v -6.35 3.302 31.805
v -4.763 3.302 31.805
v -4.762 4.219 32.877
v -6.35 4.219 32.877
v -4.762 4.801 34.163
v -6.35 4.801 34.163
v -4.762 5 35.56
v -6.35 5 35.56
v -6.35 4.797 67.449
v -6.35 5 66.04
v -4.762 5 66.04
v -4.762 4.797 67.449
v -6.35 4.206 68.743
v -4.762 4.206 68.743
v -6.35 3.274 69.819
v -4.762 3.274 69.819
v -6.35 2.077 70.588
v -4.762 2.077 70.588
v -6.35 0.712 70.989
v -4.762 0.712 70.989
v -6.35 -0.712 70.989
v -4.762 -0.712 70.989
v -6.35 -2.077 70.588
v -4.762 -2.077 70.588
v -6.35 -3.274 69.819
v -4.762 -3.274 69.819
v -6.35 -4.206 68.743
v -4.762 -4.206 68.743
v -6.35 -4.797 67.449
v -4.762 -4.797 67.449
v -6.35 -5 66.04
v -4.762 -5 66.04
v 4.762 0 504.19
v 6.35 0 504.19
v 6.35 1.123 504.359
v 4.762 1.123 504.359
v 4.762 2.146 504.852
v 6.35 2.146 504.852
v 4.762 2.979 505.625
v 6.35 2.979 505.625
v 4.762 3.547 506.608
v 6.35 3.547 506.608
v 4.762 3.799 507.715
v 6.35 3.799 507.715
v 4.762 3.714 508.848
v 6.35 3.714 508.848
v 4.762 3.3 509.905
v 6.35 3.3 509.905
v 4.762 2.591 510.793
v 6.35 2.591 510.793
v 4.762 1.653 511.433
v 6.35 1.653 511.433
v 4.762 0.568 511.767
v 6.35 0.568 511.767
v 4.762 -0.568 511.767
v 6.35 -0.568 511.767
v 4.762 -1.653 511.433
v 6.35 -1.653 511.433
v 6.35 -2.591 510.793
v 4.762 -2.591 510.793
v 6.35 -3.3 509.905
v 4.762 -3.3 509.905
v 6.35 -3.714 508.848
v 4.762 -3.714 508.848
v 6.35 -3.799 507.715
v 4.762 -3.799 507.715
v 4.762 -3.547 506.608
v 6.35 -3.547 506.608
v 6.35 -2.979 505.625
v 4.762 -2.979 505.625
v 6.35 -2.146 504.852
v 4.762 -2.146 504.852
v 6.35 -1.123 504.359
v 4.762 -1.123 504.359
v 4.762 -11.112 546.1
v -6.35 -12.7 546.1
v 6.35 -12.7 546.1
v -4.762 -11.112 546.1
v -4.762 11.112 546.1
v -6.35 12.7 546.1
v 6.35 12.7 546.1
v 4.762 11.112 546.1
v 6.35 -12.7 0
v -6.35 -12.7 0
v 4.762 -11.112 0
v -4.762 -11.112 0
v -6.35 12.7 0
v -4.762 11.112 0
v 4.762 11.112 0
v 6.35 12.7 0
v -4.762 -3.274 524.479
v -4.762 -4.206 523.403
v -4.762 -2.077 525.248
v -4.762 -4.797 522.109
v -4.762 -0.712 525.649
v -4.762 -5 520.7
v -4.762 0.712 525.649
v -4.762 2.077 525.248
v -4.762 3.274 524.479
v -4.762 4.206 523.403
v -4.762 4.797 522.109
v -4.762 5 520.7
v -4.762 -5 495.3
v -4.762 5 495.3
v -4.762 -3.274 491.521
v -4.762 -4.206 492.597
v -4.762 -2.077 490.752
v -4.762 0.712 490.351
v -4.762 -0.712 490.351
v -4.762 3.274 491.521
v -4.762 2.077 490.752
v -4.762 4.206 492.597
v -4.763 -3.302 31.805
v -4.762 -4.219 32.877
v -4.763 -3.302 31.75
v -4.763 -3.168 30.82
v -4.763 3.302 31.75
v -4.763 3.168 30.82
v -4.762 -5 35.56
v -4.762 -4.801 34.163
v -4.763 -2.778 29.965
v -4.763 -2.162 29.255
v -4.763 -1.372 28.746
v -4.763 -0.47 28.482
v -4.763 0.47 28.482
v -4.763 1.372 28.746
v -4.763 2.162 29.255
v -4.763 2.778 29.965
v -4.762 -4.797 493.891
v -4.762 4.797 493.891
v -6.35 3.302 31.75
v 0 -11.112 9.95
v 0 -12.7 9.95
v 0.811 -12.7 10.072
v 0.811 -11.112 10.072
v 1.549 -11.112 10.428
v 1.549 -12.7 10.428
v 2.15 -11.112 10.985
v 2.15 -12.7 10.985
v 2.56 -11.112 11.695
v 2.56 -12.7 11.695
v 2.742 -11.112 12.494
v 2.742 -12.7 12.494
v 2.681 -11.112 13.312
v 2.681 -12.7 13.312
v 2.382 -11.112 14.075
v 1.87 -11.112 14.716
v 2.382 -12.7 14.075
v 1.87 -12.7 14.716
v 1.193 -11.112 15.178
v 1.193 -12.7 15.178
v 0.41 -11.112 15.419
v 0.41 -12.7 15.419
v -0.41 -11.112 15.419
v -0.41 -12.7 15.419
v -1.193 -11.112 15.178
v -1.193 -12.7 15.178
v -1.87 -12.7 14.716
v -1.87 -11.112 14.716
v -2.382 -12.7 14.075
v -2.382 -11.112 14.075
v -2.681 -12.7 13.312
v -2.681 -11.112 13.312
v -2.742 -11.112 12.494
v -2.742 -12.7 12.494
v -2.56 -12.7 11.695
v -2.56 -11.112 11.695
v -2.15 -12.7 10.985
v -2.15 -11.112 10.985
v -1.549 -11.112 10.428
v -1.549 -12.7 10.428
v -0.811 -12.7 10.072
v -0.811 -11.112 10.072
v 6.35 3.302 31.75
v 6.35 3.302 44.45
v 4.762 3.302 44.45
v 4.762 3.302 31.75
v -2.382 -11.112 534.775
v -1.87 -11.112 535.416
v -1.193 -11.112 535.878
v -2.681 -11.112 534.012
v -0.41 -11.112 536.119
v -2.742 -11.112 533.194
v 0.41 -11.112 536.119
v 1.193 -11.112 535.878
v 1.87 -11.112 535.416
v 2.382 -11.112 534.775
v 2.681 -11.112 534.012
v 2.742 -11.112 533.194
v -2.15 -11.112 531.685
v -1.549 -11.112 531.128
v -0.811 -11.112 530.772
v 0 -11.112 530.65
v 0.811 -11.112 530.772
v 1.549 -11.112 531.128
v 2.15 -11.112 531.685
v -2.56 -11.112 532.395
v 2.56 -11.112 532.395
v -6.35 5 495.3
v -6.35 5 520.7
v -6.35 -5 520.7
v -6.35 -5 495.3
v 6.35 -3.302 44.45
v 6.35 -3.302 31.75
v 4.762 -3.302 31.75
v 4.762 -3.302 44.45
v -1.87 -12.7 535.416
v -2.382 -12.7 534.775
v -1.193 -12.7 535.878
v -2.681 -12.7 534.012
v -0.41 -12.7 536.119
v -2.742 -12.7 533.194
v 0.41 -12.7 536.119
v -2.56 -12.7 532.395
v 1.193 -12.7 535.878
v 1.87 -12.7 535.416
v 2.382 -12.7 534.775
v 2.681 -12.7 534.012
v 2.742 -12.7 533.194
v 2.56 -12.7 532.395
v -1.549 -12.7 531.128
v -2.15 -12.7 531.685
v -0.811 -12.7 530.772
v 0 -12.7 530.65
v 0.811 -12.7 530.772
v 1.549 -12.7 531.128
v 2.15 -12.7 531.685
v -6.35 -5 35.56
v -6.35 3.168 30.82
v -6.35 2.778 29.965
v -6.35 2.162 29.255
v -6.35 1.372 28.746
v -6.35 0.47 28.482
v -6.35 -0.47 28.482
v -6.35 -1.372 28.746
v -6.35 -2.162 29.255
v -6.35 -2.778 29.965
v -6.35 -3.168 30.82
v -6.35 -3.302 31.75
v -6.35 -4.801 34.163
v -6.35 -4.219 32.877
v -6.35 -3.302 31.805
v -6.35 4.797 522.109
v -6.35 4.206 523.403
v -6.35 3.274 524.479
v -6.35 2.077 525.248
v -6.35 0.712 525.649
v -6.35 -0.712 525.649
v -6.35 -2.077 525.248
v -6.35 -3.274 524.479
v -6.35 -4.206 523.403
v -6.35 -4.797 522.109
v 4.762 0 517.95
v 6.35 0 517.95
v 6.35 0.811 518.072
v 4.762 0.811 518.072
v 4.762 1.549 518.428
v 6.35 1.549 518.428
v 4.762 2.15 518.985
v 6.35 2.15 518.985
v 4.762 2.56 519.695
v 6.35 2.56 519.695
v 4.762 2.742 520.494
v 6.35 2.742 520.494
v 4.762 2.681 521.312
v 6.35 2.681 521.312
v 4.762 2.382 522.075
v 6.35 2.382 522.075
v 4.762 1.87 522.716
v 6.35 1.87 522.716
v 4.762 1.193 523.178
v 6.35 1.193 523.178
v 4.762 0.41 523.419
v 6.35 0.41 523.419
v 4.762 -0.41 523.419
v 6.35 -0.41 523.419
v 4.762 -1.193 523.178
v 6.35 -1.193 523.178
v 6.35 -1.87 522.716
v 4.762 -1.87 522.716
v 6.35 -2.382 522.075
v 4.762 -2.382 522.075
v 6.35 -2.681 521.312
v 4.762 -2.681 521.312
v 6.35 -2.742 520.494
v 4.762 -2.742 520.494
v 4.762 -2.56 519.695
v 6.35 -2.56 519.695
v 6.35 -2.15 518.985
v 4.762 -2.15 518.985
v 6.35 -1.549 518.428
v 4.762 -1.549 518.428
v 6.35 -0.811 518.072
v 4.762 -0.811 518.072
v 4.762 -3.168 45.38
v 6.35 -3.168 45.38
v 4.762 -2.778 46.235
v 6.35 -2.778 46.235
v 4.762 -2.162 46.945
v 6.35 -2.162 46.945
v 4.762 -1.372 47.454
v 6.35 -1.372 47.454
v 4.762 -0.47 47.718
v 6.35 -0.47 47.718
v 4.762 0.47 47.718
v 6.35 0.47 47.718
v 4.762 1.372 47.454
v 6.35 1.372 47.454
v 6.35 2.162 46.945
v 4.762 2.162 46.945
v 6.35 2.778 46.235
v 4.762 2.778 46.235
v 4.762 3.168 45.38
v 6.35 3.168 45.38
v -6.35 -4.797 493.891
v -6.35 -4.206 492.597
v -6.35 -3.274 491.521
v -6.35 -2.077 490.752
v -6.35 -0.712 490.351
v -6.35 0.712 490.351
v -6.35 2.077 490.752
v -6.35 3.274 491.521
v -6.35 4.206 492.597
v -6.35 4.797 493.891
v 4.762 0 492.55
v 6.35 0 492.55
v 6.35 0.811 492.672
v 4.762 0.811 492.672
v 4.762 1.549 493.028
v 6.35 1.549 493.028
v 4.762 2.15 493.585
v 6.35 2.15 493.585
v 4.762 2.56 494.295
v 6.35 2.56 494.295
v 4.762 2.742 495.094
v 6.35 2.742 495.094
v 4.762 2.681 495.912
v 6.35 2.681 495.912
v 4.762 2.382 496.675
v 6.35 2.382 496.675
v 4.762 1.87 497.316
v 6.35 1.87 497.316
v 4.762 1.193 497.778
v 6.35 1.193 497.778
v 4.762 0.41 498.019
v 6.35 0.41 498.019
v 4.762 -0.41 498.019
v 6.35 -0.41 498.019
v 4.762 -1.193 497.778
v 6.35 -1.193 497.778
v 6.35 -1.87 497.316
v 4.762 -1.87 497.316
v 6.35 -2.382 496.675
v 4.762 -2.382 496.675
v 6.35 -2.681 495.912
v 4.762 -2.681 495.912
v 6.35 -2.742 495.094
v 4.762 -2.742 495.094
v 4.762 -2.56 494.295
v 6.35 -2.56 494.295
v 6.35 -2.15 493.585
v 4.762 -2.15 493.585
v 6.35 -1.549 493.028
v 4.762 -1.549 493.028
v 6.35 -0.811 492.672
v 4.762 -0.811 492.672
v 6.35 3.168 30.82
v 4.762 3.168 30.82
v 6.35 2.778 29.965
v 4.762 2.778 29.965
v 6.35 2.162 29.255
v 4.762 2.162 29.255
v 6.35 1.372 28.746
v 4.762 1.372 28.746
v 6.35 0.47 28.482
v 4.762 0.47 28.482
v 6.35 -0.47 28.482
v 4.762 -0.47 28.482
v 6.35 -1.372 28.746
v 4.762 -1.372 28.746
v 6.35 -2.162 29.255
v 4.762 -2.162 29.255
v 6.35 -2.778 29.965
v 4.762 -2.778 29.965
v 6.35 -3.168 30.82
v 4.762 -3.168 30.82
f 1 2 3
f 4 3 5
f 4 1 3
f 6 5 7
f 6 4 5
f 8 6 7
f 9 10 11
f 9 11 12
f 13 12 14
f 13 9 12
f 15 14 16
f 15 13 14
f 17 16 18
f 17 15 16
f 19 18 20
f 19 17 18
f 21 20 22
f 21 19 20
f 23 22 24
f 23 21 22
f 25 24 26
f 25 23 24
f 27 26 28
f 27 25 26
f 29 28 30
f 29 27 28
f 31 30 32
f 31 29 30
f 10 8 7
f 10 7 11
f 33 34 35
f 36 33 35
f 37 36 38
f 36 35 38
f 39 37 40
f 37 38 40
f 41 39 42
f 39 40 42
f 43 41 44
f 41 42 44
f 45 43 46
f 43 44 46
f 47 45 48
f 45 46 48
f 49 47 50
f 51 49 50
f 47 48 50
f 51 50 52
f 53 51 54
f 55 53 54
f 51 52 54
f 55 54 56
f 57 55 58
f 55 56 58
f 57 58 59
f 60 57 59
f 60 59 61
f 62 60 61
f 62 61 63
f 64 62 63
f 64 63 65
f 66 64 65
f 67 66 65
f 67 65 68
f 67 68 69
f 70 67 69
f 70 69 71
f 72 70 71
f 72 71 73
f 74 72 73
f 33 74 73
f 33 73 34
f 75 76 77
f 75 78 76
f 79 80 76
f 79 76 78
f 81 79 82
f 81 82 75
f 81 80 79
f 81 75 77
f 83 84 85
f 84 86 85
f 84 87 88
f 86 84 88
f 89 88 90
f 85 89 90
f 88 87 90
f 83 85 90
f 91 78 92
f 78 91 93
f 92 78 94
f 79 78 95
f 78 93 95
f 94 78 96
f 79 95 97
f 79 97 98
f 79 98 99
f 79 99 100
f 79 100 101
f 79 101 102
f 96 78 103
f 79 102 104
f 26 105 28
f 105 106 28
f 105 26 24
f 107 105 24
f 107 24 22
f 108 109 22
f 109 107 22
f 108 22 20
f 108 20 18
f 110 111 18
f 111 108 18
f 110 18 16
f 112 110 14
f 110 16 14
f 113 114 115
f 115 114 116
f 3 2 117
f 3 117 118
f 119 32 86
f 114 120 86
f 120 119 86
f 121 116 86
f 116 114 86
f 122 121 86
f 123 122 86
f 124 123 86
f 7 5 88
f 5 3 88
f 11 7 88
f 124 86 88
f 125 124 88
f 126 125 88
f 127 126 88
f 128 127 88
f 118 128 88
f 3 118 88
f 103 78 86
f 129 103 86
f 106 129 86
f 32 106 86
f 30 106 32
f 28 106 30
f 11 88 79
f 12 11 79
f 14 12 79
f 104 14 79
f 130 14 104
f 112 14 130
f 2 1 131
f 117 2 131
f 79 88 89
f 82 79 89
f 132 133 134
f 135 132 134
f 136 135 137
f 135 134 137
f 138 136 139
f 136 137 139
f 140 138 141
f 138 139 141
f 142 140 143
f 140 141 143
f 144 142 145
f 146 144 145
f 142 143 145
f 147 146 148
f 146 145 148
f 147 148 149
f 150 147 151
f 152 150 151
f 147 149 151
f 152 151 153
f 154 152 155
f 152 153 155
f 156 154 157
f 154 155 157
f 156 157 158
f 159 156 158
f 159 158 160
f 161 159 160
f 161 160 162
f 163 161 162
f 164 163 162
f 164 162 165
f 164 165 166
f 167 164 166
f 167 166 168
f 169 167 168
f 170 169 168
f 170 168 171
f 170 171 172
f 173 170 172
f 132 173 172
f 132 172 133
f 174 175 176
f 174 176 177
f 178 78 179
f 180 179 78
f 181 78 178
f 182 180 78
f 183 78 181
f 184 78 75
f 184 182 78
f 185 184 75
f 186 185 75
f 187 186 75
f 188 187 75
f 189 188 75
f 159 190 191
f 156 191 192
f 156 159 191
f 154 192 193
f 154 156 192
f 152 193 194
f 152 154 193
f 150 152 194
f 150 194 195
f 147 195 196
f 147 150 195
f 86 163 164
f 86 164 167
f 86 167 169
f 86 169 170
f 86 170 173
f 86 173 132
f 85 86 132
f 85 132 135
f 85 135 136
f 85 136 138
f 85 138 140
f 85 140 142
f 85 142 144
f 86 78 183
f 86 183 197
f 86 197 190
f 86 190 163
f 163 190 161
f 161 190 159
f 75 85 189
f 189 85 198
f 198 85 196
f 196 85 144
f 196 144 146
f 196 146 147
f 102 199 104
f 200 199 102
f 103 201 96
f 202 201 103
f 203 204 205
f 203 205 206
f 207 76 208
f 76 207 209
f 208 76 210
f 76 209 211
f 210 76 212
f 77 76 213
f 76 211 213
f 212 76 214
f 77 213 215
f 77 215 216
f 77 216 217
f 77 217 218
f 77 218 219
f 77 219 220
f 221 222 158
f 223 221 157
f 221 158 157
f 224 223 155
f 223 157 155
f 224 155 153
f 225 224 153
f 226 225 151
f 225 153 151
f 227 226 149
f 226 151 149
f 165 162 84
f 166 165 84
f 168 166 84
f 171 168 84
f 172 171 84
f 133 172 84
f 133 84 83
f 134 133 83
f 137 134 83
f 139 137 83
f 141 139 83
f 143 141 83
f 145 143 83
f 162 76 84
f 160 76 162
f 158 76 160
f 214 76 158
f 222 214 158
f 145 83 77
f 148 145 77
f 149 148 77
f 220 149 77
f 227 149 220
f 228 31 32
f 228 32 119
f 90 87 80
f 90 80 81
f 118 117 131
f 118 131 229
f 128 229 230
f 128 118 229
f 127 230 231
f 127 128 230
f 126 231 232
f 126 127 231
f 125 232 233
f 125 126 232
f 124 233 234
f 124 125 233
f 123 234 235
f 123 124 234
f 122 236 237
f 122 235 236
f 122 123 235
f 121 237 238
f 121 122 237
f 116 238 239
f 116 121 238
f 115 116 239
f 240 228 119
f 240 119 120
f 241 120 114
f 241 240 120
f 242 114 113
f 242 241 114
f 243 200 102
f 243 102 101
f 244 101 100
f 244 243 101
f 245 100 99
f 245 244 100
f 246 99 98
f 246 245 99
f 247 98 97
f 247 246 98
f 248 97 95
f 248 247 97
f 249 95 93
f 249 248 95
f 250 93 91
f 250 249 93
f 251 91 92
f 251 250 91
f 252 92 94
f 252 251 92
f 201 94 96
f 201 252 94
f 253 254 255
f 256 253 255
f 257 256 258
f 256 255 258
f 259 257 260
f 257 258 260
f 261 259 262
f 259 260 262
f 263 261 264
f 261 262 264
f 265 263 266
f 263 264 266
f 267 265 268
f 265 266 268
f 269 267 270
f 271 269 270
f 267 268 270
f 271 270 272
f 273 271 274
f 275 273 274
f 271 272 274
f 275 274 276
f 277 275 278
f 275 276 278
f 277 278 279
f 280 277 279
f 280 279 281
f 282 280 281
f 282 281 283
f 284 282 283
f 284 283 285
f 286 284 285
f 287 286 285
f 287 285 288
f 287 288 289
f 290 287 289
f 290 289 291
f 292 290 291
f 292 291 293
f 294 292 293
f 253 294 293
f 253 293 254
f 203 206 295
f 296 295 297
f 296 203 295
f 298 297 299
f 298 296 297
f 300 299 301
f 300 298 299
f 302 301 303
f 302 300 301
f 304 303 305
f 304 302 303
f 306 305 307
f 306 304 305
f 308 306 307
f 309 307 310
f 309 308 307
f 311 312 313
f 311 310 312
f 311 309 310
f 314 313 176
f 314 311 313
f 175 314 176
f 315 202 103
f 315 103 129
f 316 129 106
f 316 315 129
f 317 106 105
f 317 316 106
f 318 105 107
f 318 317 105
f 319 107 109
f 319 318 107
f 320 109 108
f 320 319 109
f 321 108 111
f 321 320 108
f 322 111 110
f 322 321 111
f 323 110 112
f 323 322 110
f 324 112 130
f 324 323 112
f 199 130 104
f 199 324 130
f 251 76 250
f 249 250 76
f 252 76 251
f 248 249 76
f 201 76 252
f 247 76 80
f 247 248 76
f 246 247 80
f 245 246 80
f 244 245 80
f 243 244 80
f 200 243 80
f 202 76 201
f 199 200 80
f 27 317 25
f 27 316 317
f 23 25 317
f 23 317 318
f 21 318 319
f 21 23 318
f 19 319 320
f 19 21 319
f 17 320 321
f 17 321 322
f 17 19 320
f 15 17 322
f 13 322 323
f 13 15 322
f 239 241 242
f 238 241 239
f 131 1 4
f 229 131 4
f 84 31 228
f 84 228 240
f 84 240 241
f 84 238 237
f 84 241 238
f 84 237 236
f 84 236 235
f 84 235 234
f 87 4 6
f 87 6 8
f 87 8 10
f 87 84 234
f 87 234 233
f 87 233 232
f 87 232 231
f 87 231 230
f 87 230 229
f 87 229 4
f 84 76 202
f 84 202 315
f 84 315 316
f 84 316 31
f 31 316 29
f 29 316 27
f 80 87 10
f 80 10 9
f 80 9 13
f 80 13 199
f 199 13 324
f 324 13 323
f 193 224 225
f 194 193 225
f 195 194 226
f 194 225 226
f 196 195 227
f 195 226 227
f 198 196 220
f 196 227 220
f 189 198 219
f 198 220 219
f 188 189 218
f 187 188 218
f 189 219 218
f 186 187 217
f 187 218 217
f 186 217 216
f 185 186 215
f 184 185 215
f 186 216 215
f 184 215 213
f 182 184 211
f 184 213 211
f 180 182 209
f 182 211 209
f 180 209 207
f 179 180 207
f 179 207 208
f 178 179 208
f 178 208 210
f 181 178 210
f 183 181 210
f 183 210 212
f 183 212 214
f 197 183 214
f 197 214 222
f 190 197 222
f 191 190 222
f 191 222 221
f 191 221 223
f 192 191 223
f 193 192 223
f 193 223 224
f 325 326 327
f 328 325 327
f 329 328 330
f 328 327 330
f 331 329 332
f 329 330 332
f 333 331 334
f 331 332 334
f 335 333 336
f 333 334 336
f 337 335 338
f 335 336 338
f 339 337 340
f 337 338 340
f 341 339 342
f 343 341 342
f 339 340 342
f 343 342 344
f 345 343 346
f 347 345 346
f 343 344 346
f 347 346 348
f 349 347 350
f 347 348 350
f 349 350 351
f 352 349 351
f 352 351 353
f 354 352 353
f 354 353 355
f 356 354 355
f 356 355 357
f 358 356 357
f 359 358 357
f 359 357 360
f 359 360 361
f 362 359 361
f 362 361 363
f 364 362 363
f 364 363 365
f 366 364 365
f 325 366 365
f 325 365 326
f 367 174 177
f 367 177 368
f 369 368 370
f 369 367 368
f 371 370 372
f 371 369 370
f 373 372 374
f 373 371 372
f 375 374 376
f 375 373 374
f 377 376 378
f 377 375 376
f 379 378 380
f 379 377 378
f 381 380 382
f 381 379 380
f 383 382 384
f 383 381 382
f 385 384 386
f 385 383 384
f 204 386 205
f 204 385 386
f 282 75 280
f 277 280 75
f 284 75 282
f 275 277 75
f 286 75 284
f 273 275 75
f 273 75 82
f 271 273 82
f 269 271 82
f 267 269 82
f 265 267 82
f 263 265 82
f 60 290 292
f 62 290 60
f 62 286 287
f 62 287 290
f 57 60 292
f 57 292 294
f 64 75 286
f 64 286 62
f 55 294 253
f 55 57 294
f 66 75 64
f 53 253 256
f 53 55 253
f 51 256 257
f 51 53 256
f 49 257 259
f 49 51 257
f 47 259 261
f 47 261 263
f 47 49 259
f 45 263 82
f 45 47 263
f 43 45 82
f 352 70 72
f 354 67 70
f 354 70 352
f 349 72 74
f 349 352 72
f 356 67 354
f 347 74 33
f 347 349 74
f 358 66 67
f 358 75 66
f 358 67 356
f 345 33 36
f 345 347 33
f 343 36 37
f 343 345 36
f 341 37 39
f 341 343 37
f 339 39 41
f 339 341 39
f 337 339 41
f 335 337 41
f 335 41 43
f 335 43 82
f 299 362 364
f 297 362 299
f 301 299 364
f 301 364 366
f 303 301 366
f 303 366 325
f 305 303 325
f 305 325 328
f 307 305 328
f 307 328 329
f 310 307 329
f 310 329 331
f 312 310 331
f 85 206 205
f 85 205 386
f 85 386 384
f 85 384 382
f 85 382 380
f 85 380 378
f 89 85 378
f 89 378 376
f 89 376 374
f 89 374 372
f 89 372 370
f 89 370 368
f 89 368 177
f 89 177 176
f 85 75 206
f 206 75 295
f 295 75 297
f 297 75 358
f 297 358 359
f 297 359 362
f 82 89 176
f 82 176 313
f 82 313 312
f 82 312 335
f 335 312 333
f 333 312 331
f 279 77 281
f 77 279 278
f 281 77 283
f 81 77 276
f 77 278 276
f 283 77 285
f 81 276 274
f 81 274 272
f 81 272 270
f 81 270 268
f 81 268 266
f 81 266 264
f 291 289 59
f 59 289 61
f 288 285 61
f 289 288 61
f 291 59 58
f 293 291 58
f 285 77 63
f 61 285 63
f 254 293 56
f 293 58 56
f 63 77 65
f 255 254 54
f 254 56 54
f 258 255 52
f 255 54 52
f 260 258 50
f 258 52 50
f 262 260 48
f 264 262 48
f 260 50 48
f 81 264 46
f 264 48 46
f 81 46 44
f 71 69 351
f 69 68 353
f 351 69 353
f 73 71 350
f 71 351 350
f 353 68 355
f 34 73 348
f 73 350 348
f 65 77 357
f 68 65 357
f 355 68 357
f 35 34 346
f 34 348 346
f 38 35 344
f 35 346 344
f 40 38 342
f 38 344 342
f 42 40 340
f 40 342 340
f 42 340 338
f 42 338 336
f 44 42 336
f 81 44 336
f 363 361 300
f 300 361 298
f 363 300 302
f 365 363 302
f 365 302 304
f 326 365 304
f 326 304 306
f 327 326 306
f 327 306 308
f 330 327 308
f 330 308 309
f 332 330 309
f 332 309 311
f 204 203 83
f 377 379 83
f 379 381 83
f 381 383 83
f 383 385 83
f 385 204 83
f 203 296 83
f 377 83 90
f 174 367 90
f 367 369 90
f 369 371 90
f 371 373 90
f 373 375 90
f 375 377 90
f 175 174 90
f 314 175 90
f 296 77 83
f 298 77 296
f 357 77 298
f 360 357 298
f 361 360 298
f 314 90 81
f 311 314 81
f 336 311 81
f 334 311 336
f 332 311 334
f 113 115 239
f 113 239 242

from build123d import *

# Parameters (mm, degrees)
SKETCH1_W           = 12.7
SKETCH1_H           = 25.4
SKETCH1_W_2         = 9.525
SKETCH1_H_2         = 22.225
BOSS_EXTRUDE1_DEPTH = 546.1
SKETCH2_R           = 3.81
SKETCH2_R_2         = 2.75
CUT_EXTRUDE1_DEPTH  = 547.395269013
CUT_EXTRUDE3_REACH  = 548.395
CUT_EXTRUDE5_REACH  = 548.727
SKETCH5_R           = 2.75


with BuildPart() as part:
    # Sketch1 → Boss-Extrude1 (new body)
    with BuildSketch(Plane.XY):
        Rectangle(SKETCH1_W, SKETCH1_H)
        Rectangle(SKETCH1_W_2, SKETCH1_H_2, mode=Mode.SUBTRACT)
    extrude(amount=BOSS_EXTRUDE1_DEPTH)

    # Sketch2 → Cut-Extrude1 (cut, through all)
    with BuildSketch(Plane(origin=(6.35, 0, 0), x_dir=(0, 0, -1), z_dir=(1, 0, 0))):
        with Locations((-508, 0)):
            Circle(SKETCH2_R)
        with Locations((-520.7, 0)):
            Circle(SKETCH2_R_2)
        with Locations((-495.3, 0)):
            Circle(SKETCH2_R_2)
        with BuildLine():
            Line((-31.75, -3.302), (-44.45, -3.302))
            ThreePointArc((-44.45, -3.302), (-47.752, 0), (-44.45, 3.302))
            Line((-44.45, 3.302), (-31.75, 3.302))
            ThreePointArc((-31.75, 3.302), (-28.448, 0), (-31.75, -3.302))
        make_face()
    extrude(amount=-CUT_EXTRUDE1_DEPTH, mode=Mode.SUBTRACT)

    # Sketch4 → Cut-Extrude3 (cut, up to next)
    with BuildSketch(Plane.ZY.offset(6.35), mode=Mode.PRIVATE) as cut_extrude3_sk1:
        with BuildLine():
            Line((35.56, 5), (66.04, 5))
            ThreePointArc((66.04, 5), (71.04, 0), (66.04, -5))
            Line((66.04, -5), (35.56, -5))
            ThreePointArc((35.56, -5), (30.56, 0), (35.56, 5))
        make_face()
    cut_extrude3_tool1 = extrude(cut_extrude3_sk1.sketch, amount=-CUT_EXTRUDE3_REACH, mode=Mode.PRIVATE) & part.part
    # Sketch4 → Cut-Extrude3 (cut, up to next)
    with BuildSketch(Plane.ZY.offset(6.35), mode=Mode.PRIVATE) as cut_extrude3_sk2:
        with BuildLine():
            Line((495.3, 5), (520.7, 5))
            ThreePointArc((520.7, 5), (525.7, 0), (520.7, -5))
            Line((520.7, -5), (495.3, -5))
            ThreePointArc((495.3, -5), (490.3, 0), (495.3, 5))
        make_face()
    cut_extrude3_tool2 = extrude(cut_extrude3_sk2.sketch, amount=-CUT_EXTRUDE3_REACH, mode=Mode.PRIVATE) & part.part
    add(cut_extrude3_tool1.solids().sort_by_distance((-6.35, 0, 50.8))[0], mode=Mode.SUBTRACT)
    add(cut_extrude3_tool2.solids().sort_by_distance((-6.35, 0, 508))[0], mode=Mode.SUBTRACT)

    # Sketch5 → Cut-Extrude5 (cut, up to next)
    with BuildSketch(Plane.XZ.offset(12.7), mode=Mode.PRIVATE) as cut_extrude5_sk1:
        with Locations(Location((0, 533.4, 0), (0, 0, 270))):
            Circle(SKETCH5_R)
    cut_extrude5_tool1 = extrude(cut_extrude5_sk1.sketch, amount=-CUT_EXTRUDE5_REACH, mode=Mode.PRIVATE) & part.part
    # Sketch5 → Cut-Extrude5 (cut, up to next)
    with BuildSketch(Plane.XZ.offset(12.7), mode=Mode.PRIVATE) as cut_extrude5_sk2:
        with Locations(Location((0, 12.7, 0), (0, 0, 270))):
            Circle(SKETCH5_R)
    cut_extrude5_tool2 = extrude(cut_extrude5_sk2.sketch, amount=-CUT_EXTRUDE5_REACH, mode=Mode.PRIVATE) & part.part
    add(cut_extrude5_tool1.solids().sort_by_distance((0, -12.7, 533.4))[0], mode=Mode.SUBTRACT)
    add(cut_extrude5_tool2.solids().sort_by_distance((0, -12.7, 12.7))[0], mode=Mode.SUBTRACT)


solid = part.part
